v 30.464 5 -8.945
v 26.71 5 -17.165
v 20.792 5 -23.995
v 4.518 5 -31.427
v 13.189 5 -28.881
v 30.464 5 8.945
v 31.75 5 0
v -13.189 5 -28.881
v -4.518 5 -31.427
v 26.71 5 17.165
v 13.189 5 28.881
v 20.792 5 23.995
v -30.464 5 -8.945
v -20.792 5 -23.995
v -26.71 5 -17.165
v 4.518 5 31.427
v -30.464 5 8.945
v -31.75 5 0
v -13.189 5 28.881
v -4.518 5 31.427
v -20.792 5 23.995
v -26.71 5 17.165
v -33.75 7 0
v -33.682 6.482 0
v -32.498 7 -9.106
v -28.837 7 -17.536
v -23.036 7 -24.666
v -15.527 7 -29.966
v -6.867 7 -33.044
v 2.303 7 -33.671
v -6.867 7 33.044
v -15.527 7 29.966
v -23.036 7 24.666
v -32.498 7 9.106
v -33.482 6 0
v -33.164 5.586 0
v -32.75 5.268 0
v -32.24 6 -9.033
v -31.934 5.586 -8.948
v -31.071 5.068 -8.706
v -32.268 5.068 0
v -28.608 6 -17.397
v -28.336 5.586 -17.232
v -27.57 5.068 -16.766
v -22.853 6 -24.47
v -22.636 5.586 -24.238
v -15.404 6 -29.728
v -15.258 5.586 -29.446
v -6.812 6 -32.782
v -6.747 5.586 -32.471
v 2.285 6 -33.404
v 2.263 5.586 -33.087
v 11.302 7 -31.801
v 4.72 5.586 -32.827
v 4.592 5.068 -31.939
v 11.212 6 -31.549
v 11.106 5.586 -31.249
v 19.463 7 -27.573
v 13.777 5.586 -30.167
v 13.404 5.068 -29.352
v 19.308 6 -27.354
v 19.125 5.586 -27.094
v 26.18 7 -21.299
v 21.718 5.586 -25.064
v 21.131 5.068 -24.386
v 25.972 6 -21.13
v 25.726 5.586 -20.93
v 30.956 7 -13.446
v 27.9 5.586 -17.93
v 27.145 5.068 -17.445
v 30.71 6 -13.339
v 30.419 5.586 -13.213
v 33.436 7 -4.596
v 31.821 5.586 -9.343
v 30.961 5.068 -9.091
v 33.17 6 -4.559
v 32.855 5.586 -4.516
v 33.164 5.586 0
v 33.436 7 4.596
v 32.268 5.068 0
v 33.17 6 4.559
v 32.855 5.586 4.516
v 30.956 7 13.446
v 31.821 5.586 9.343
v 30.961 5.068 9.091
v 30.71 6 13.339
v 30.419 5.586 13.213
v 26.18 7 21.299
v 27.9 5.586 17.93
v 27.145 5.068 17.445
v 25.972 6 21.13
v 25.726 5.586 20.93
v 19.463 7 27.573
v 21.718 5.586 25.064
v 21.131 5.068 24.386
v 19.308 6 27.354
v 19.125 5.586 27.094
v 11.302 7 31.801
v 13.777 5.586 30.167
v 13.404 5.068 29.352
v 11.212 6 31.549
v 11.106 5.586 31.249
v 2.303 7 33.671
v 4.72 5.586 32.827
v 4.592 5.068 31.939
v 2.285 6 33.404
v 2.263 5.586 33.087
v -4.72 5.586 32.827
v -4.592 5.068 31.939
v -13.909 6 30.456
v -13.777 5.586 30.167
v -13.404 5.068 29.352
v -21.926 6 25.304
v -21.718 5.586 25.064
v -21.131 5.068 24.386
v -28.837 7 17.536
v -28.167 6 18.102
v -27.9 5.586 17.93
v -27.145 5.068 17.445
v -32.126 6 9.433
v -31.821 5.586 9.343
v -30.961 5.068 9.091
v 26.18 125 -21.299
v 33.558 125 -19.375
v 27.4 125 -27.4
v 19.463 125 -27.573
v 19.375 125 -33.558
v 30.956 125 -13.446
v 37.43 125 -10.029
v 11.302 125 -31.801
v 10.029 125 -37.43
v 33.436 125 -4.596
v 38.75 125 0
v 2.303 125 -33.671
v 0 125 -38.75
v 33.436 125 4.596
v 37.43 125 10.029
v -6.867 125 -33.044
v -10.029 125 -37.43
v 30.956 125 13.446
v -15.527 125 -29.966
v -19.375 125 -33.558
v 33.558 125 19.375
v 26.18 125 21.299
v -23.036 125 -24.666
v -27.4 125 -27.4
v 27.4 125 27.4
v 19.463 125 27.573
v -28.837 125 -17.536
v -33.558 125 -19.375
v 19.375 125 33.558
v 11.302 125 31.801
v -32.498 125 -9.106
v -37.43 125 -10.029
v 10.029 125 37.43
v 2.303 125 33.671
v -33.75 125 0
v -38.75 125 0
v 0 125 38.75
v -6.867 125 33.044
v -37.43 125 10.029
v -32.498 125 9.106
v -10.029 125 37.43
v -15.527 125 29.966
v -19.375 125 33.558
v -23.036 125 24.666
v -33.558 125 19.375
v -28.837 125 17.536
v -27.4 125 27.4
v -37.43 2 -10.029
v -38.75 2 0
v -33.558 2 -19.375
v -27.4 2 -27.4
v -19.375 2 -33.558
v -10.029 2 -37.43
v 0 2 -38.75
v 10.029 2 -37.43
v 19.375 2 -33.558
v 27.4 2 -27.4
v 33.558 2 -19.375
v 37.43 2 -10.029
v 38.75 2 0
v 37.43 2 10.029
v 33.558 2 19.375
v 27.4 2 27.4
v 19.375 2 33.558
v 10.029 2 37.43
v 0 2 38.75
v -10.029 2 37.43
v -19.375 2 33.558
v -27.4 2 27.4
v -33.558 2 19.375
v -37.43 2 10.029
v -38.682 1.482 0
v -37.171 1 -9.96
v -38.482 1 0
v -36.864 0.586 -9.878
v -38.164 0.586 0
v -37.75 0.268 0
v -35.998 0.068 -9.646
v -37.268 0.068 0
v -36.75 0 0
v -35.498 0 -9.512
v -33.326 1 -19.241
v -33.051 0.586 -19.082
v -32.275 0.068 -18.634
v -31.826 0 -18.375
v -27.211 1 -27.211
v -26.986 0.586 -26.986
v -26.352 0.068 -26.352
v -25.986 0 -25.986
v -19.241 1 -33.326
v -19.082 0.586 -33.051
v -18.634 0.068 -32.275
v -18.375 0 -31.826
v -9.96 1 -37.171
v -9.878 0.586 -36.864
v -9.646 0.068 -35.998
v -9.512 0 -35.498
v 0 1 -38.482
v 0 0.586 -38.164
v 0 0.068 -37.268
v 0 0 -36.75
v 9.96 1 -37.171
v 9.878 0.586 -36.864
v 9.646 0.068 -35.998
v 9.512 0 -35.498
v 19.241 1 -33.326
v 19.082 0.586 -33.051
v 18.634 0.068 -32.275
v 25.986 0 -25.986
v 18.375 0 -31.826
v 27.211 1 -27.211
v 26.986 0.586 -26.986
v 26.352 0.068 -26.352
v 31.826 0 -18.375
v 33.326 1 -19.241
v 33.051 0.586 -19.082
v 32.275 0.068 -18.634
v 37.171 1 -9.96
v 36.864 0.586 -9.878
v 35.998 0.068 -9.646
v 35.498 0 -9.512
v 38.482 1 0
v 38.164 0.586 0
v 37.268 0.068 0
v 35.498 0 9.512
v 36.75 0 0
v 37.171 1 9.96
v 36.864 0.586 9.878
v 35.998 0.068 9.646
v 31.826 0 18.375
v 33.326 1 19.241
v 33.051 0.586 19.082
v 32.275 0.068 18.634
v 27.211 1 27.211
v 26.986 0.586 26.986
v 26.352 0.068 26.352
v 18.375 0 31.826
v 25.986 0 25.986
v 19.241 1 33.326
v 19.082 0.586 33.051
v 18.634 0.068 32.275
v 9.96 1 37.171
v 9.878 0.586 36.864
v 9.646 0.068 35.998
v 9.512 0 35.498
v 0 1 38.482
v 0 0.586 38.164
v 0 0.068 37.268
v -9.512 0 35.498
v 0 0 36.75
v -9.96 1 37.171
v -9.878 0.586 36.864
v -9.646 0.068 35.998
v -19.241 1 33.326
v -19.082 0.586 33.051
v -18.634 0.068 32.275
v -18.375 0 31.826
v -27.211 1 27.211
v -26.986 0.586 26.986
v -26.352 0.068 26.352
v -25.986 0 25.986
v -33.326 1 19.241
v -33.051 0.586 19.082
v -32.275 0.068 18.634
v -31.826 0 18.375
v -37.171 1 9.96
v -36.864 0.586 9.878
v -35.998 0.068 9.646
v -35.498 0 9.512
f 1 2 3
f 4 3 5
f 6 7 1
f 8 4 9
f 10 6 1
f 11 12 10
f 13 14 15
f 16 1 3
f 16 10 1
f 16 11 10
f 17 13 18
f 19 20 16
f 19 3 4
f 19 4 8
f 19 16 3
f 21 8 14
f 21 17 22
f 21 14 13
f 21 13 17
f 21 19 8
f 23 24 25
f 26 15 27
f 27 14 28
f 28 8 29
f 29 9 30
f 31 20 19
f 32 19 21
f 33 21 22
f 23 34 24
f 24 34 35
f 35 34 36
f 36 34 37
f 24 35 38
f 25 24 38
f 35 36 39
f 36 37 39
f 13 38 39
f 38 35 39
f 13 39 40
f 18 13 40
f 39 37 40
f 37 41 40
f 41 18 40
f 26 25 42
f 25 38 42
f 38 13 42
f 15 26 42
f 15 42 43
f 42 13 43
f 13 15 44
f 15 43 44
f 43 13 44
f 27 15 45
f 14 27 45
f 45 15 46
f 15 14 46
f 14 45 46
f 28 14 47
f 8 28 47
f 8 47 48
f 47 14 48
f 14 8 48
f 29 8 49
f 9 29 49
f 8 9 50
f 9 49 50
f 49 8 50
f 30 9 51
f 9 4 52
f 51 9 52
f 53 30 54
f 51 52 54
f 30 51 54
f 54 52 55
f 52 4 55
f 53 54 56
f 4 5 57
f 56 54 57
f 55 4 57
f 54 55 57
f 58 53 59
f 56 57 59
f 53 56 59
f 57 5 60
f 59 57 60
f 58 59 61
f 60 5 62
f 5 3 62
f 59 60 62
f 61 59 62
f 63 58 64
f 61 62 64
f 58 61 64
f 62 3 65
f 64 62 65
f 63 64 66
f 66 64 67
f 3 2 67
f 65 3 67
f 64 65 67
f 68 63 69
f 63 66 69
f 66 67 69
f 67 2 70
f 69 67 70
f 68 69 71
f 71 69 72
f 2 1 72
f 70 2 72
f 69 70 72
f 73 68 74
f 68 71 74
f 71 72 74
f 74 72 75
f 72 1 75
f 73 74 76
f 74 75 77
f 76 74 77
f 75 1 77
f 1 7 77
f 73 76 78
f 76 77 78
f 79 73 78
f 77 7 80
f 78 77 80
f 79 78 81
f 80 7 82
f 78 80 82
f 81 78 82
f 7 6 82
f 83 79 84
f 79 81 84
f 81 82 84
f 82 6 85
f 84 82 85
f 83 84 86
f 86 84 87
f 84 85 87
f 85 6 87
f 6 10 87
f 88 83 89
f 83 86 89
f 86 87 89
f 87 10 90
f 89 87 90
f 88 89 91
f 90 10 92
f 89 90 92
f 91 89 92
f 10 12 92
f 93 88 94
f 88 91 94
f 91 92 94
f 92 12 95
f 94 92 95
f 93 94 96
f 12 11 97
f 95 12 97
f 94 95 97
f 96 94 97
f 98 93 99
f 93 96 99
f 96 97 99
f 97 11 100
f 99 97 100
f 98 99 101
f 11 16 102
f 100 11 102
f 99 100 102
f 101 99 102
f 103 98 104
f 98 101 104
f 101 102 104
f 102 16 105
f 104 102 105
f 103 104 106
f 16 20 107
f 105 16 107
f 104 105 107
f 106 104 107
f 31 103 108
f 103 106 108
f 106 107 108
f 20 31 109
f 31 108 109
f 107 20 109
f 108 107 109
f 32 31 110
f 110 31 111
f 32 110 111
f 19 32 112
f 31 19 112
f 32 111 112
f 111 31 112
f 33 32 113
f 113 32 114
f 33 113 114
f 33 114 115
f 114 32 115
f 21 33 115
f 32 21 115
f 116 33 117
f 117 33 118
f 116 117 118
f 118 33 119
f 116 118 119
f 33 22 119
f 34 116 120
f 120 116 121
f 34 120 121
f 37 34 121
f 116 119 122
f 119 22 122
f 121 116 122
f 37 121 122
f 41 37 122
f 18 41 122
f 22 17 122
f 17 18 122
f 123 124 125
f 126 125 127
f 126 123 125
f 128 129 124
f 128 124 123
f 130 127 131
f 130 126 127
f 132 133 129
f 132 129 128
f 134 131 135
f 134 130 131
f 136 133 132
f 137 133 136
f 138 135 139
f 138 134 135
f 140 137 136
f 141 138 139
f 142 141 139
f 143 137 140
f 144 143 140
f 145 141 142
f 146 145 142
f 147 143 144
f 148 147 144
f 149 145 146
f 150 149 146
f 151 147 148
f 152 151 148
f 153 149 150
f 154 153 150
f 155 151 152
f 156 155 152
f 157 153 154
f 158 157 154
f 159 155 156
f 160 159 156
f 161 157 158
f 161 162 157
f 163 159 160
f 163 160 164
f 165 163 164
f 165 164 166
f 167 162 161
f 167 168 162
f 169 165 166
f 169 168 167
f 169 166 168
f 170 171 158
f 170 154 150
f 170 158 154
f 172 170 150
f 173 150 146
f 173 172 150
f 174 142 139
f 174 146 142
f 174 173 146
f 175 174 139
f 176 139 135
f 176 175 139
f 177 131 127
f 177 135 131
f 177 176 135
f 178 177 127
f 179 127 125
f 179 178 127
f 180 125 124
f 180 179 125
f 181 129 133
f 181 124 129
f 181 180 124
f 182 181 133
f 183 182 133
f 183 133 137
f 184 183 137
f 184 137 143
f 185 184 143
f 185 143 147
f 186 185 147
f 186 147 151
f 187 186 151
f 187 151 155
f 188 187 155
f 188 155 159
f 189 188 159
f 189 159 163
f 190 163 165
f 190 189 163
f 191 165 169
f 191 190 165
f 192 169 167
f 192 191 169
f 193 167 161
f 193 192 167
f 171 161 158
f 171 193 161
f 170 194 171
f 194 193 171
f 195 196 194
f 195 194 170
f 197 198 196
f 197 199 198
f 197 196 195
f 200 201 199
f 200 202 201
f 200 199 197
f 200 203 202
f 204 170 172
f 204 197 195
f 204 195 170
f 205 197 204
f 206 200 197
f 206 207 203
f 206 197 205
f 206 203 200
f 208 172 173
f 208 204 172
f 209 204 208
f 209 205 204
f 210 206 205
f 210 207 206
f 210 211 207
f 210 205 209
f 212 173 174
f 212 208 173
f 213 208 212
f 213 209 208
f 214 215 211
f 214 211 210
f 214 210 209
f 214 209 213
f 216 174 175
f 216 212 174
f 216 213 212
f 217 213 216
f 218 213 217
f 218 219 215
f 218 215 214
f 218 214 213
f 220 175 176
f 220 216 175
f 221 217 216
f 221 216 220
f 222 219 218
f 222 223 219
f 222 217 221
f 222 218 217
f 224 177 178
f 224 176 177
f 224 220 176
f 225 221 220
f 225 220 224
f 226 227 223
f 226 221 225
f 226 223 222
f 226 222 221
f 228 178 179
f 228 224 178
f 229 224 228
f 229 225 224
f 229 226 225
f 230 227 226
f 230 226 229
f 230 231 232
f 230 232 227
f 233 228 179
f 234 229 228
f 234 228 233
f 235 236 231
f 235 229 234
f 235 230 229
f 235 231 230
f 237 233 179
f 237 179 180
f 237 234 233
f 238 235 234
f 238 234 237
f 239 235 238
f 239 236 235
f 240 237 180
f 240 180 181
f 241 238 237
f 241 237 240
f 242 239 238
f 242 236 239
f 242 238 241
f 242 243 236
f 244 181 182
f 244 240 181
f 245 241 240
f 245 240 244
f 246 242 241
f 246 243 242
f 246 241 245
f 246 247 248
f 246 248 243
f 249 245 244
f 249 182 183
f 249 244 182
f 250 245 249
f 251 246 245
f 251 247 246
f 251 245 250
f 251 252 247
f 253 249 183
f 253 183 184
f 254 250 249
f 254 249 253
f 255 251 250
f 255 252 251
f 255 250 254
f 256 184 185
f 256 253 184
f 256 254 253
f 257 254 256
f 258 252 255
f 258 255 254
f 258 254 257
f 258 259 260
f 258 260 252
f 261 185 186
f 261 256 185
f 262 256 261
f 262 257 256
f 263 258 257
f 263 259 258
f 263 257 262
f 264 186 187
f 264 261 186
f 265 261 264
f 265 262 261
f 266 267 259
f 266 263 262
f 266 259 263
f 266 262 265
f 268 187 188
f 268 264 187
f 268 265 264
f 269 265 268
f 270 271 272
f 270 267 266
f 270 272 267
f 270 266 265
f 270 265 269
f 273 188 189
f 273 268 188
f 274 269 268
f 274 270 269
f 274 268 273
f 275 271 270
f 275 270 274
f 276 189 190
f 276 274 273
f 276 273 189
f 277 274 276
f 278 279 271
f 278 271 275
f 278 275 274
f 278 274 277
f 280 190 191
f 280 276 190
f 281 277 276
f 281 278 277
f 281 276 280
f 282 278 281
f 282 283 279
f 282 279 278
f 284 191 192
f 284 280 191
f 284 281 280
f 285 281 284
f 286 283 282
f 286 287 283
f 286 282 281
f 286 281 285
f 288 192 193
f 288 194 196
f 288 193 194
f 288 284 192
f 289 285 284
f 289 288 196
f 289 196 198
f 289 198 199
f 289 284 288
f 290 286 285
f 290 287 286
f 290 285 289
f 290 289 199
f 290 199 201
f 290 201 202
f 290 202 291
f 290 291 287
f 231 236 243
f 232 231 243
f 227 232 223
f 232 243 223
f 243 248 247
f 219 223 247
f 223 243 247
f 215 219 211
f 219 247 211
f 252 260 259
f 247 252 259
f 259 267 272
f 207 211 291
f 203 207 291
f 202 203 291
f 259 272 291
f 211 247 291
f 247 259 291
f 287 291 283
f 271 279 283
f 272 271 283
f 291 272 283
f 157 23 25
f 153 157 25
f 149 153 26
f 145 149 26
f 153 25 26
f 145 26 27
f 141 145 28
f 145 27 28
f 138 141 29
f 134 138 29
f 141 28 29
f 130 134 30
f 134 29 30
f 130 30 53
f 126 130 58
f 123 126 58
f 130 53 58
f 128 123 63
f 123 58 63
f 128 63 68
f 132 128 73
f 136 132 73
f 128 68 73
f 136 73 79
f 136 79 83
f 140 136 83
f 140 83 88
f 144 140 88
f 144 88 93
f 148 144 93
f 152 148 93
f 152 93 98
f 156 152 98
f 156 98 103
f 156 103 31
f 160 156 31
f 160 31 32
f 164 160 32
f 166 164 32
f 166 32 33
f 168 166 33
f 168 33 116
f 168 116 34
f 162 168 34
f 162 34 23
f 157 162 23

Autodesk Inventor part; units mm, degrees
ref_plane "YZ Plane" through (0, 0, 0) normal (1, 0, 0) x (0, 1, 0)
ref_plane "XZ Plane" through (0, 0, 0) normal (0, 1, 0) x (-1, 0, 0)
ref_plane "XY Plane" through (0, 0, 0) normal (0, 0, 1) x (1, 0, 0)
sketch "Sketch1" plane through (0, 0, 0) normal (0, 1, 0) x (-1, 0, 0)
  circle A0 centre (0, 0) radius 38.75
  dimension "d0" = 77.5
extrude "Extrusion1" add sketch "Sketch1" along normal blind 125
shell "Shell1" thickness 5 removed faces 1 at (-4.4693, 125, 5.6043)
fillet "Fillet1" radius 2 2 edges at (33.75, 5, 0) (38.75, 0, 0)
properties part number "Inner Layer"
